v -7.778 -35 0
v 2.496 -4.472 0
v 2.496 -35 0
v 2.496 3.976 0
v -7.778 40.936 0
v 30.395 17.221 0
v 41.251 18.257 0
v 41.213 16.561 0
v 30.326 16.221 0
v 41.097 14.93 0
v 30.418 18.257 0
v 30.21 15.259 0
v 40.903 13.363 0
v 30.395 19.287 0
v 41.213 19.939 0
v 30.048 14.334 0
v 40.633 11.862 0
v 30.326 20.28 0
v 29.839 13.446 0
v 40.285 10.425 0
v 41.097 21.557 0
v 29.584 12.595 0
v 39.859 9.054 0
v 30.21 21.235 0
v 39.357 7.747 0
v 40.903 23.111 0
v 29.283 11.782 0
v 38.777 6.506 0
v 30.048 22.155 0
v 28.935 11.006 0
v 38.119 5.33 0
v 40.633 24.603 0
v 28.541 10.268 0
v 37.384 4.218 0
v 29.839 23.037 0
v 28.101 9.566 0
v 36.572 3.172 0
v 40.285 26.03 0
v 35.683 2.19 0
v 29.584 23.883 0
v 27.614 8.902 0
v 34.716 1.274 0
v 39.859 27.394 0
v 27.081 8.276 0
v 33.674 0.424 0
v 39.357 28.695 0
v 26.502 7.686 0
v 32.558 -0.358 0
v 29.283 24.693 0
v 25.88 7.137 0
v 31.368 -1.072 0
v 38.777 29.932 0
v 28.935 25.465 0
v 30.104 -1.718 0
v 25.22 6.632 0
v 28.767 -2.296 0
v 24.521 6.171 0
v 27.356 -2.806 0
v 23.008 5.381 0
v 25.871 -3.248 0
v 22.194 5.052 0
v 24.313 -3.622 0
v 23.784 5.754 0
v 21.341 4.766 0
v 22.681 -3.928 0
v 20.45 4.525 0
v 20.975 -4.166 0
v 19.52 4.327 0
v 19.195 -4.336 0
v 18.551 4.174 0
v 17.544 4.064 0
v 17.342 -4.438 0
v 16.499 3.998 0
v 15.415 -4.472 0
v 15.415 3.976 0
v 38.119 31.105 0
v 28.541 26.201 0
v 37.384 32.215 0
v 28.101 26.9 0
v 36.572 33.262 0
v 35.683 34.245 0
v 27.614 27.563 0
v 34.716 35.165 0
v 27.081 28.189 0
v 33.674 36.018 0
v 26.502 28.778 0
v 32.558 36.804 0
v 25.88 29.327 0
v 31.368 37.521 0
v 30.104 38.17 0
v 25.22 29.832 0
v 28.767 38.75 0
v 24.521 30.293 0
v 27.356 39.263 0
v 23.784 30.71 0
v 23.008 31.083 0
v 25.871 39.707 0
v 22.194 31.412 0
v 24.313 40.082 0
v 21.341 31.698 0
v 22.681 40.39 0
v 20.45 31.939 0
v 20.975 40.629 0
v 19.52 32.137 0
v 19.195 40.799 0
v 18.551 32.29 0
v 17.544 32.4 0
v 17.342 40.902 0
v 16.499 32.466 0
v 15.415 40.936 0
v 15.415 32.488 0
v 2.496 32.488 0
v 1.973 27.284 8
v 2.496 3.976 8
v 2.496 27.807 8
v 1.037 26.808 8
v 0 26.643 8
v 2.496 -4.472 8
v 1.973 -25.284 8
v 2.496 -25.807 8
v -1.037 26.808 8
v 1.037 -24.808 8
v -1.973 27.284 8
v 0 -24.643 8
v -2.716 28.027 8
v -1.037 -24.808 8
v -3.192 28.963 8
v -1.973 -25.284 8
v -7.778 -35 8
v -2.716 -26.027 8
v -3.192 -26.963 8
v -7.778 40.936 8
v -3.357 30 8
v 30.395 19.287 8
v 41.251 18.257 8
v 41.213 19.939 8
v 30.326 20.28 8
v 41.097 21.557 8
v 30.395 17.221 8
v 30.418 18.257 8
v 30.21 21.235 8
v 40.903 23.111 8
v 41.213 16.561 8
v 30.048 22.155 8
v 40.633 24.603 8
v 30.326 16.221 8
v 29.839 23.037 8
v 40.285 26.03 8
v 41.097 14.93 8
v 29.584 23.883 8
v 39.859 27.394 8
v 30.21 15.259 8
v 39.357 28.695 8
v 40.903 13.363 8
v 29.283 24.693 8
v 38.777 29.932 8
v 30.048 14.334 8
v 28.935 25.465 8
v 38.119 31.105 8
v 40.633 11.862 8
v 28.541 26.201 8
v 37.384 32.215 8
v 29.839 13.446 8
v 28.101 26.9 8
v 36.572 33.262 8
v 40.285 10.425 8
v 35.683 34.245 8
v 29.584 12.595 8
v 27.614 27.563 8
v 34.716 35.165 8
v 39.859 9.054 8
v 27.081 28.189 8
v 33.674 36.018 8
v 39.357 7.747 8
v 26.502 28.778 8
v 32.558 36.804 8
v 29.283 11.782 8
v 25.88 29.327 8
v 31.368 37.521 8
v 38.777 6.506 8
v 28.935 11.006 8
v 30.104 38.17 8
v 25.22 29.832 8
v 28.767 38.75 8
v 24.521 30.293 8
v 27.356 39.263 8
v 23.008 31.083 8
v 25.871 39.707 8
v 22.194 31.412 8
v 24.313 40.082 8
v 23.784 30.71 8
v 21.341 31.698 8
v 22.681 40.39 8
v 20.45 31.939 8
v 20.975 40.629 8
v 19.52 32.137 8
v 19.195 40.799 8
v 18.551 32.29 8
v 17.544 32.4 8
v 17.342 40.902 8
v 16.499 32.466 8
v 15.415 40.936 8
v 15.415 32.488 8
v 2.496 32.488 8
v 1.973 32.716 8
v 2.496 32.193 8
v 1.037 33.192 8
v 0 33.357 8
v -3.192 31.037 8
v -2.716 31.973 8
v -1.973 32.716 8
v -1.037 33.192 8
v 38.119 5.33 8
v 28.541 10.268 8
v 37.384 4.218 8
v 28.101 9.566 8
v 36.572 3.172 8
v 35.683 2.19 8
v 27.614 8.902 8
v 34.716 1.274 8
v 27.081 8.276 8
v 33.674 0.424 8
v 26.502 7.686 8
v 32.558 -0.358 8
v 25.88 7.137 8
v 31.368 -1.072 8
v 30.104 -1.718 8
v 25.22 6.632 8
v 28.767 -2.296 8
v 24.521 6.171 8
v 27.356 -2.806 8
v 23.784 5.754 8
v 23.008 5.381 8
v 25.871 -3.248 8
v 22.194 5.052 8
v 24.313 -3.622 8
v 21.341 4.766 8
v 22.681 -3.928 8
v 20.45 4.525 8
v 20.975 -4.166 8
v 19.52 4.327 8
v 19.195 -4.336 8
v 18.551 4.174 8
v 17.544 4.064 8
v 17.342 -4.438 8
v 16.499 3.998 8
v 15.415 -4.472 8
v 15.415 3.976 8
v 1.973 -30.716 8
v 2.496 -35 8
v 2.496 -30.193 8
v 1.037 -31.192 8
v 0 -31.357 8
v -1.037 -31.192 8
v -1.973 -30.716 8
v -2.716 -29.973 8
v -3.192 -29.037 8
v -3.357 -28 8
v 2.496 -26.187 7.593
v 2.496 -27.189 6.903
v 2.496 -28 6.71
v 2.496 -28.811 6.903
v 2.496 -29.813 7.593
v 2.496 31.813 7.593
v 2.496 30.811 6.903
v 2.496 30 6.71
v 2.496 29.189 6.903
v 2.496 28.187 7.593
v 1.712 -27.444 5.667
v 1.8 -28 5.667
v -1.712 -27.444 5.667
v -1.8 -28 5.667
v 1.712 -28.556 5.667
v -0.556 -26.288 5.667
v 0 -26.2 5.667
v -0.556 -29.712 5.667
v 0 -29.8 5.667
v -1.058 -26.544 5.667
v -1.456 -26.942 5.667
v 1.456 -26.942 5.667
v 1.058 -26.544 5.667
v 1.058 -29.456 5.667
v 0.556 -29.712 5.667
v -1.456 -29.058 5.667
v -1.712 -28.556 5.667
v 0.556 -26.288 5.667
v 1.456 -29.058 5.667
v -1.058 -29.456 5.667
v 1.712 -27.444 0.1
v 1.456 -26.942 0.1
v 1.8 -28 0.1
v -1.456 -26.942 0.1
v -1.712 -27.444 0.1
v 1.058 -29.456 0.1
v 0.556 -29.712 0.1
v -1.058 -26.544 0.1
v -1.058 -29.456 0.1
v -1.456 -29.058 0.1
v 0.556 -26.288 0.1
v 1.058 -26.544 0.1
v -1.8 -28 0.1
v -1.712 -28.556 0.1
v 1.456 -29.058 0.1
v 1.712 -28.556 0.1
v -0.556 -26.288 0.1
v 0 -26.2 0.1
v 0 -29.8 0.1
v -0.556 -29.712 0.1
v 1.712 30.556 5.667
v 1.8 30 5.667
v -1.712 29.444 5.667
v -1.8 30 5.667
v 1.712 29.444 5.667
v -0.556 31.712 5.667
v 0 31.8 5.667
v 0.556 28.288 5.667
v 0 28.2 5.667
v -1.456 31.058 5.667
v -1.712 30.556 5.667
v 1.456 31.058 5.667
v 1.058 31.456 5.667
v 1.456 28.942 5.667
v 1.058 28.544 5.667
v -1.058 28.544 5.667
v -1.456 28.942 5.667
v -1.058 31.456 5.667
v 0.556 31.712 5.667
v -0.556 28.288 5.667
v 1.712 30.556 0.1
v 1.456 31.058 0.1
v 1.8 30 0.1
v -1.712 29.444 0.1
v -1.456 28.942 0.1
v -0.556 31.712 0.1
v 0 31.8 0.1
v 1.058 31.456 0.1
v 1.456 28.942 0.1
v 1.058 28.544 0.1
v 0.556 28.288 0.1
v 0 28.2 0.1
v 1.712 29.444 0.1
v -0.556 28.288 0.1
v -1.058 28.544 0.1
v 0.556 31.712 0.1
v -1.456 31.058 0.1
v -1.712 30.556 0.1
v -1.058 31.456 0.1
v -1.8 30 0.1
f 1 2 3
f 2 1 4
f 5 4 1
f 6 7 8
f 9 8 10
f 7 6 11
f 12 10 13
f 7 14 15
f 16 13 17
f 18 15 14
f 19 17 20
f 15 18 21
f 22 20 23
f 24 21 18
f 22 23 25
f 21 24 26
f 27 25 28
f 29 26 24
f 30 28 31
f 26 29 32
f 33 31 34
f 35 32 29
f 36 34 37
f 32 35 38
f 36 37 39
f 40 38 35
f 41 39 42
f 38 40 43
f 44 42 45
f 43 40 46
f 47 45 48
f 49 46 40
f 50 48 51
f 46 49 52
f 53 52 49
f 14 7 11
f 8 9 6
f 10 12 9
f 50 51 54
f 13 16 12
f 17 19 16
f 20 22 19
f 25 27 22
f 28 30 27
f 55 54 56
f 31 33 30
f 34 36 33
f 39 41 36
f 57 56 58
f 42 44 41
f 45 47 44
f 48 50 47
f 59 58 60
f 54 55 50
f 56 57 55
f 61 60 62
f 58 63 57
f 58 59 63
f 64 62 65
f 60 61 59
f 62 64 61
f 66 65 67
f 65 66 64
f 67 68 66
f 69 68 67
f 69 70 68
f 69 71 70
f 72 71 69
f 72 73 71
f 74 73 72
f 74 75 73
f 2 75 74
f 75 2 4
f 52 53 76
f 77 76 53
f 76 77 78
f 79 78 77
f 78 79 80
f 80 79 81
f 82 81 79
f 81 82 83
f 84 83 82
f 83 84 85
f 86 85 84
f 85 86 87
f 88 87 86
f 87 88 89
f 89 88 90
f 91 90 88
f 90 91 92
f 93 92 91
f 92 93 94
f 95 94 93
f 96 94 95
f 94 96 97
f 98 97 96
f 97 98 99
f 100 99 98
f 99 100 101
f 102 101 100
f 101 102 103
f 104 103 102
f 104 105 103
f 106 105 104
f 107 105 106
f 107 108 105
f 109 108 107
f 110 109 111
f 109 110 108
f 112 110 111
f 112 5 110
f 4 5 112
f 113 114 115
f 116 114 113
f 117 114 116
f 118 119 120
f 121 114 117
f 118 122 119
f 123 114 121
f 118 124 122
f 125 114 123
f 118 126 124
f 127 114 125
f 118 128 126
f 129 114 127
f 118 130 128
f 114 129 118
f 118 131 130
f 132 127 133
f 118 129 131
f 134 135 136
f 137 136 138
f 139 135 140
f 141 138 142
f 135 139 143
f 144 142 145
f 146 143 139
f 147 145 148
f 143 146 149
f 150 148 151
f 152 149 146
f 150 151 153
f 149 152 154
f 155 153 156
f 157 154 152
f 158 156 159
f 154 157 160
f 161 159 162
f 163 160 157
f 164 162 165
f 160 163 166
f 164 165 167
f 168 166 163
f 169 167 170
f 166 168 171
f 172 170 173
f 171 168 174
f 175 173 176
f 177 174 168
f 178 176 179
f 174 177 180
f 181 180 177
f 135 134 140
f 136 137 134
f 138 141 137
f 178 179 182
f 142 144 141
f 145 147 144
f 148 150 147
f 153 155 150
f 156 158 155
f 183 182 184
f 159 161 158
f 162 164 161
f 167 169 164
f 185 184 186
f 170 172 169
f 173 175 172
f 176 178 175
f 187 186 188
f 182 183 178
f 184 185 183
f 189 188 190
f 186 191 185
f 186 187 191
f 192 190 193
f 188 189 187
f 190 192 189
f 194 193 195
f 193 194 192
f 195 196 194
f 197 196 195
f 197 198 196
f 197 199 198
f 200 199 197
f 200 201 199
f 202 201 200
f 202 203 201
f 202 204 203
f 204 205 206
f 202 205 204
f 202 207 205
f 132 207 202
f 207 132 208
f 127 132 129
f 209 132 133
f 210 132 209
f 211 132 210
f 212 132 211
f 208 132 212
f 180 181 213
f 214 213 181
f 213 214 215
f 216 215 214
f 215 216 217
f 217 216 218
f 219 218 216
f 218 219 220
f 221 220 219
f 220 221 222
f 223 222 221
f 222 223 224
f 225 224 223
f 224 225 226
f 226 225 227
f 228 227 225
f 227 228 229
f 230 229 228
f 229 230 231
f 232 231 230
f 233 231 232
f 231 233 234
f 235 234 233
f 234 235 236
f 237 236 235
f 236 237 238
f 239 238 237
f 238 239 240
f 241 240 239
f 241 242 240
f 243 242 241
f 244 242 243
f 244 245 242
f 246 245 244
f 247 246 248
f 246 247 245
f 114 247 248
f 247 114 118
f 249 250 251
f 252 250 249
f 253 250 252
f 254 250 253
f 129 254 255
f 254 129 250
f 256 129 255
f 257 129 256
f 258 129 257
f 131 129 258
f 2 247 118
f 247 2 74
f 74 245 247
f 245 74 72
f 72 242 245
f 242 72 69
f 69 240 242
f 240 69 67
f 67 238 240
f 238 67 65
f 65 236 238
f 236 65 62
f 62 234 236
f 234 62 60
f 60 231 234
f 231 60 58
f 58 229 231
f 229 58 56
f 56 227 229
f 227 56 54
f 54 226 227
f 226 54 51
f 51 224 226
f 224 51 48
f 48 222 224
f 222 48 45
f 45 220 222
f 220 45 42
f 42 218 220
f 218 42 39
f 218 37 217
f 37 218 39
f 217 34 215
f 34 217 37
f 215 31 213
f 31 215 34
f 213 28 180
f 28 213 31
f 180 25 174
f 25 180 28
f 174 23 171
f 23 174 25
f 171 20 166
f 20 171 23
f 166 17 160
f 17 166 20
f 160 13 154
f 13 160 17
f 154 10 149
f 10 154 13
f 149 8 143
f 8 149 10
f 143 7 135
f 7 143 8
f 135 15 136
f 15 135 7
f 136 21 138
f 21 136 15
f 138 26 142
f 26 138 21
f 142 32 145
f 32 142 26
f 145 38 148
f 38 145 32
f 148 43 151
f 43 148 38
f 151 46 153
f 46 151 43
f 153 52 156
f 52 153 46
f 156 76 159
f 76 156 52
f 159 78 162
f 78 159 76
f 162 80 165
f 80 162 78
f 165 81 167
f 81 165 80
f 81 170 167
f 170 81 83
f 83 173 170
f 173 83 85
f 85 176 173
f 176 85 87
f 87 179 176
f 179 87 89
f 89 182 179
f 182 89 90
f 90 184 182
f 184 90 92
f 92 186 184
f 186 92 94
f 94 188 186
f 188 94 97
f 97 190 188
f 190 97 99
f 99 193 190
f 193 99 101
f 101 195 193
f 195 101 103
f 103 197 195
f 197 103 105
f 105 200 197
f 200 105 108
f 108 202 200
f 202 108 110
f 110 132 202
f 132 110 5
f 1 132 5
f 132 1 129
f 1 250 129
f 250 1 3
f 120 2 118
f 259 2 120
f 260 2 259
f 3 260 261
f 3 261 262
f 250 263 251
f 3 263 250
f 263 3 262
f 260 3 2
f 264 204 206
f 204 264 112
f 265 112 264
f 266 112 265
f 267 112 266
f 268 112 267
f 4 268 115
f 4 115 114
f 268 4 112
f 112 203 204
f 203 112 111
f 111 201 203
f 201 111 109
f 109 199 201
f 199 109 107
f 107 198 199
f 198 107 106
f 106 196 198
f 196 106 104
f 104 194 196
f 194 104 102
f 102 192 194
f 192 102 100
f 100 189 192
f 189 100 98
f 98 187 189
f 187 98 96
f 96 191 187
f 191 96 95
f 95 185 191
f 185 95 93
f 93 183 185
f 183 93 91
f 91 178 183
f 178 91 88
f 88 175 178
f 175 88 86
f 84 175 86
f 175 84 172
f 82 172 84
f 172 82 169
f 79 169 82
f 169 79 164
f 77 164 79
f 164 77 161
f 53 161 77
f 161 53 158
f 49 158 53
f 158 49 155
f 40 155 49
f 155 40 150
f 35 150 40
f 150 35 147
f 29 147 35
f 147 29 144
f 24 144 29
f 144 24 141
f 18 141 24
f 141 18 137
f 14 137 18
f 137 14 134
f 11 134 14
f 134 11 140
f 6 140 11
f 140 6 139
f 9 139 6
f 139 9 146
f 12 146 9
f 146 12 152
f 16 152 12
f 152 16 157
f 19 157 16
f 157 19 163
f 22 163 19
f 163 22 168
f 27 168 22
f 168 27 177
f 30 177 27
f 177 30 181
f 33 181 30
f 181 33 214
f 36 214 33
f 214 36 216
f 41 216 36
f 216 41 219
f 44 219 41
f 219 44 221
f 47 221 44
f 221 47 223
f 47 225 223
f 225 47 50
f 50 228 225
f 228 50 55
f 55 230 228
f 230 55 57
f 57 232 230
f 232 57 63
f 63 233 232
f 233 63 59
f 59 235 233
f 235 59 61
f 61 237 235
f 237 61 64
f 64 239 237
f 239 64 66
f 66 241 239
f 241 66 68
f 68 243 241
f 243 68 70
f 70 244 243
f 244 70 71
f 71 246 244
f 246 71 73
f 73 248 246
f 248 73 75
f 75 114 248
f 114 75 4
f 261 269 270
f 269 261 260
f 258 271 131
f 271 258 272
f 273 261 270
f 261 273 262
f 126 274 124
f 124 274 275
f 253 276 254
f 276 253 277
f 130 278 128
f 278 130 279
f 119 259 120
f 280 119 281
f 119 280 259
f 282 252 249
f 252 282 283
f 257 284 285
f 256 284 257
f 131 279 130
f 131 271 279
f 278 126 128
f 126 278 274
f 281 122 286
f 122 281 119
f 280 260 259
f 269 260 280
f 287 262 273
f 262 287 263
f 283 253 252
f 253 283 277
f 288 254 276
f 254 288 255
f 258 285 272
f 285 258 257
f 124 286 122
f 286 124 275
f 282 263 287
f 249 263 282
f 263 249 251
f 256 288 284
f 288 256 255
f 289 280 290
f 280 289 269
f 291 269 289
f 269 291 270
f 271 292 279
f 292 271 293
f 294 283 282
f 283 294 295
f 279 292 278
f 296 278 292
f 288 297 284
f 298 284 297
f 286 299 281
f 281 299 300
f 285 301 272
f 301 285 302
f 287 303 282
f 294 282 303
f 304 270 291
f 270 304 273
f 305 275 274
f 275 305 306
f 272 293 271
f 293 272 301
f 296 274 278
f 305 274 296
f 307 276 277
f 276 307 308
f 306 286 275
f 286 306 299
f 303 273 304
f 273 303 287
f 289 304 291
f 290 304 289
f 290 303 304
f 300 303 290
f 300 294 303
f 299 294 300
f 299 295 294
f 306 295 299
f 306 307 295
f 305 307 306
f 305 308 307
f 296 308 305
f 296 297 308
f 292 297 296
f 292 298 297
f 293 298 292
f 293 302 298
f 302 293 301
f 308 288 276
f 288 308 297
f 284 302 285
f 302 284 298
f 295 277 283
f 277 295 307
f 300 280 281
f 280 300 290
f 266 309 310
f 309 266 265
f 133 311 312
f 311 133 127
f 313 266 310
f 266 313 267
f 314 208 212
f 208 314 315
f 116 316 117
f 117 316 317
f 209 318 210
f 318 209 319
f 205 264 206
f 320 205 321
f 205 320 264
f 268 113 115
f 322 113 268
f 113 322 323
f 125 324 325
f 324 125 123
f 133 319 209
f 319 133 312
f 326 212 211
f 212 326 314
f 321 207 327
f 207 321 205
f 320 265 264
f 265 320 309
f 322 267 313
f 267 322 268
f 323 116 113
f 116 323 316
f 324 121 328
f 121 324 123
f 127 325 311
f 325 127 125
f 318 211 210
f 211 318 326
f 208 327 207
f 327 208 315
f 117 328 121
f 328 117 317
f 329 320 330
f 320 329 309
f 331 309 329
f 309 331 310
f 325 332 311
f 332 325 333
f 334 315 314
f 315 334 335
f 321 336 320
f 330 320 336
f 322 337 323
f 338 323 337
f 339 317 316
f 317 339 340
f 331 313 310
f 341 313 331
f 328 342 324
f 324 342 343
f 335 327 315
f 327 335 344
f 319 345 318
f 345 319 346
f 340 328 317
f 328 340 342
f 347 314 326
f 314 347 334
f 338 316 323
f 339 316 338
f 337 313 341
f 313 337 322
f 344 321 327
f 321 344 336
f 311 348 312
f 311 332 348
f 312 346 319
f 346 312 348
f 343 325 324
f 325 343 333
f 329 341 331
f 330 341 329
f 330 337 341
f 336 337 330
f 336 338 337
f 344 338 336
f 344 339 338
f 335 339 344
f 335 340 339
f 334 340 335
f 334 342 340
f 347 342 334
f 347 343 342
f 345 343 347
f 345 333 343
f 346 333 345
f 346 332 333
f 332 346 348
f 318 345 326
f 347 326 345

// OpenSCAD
// Street Numbers for 3D printing
// Charles Tilford, 2019
// License: CC BY-NC-SA 4.0
//   https://creativecommons.org/licenses/by-nc-sa/4.0/

char="P";     // The number/letter to print

// Units are in mm, except for height of letter

// How many inches high should letter be?
inchesHigh=3;
// How thick/deep should letter be (mm)?
depth=8;

// Character coordinates just center the letter
charX=-18;    // Character X coord
charY=-35;    // Character Y coord
topScrew=30;  // Top screw Y coord
botScrew=-28; // Bottom screw Y coord
height=8;     // Thickness of character
// Screw dimensions. Default presumes
// #6 sheet metal screw
screwWid=3.6; // Width of screw shaft
screwTop=6.78;// Width of screw head
screwCon=5.08;// Height of head 'cone'

// Font to print in. Your system needs this
// installed, of course. If changed the hole
// positions almost certainly need to be
// changed, and maybe charX/charY.
fName="Open Sans Extrabold";
// https://fonts.google.com/specimen/Open+Sans
// Designer: Steve Matteson

// Thin floor below holes. My printer was
// struggling to have the hole 'border' stick
// to the stage. Just drill/screw thru it.
holeFloor=0.1; 

// ==========================================
// ===== All values below are auto-calculated
// ==========================================

// Scaled values
scaleFactor=inchesHigh / 3;
cX=charX * scaleFactor;
cY=charY * scaleFactor;
tS=topScrew * scaleFactor;
bS=botScrew * scaleFactor;
// Where do we start drawing screw head cone?
oS=depth - (screwCon-.05);

difference() {
  // We use difference() to punch out the screw holes
  // in the character
    
  // The character itself, 8mm thick
  translate([cX,cY,0])
    linear_extrude(height=depth, scale=1)
    text(char, size=(75*scaleFactor),
         $fn=100, font=fName);
    
  // Bottom screw hole
  translate([0,bS,oS]) color("red")
    cylinder(h=screwCon, d2=screwTop,
             d1=0, $fn=20);
   translate([0,bS,holeFloor])
    cylinder(h=20, d=screwWid, $fn=20);
    
  // Top screw hole
  translate([0,tS,oS]) color("red")
    cylinder(h=screwCon, d2=screwTop,
             d1=0, $fn=20);
  translate([0,tS,holeFloor])
    cylinder(h=20, d=screwWid, $fn=20);
}

// Colors are just to aid visualization of
// void spaces. $fn is "featuer number", ie how
// many polygons are devoted to object. The values
// above should be near your printing limit anyway.

// Developed in OpenSCAD
//    https://www.openscad.org/
